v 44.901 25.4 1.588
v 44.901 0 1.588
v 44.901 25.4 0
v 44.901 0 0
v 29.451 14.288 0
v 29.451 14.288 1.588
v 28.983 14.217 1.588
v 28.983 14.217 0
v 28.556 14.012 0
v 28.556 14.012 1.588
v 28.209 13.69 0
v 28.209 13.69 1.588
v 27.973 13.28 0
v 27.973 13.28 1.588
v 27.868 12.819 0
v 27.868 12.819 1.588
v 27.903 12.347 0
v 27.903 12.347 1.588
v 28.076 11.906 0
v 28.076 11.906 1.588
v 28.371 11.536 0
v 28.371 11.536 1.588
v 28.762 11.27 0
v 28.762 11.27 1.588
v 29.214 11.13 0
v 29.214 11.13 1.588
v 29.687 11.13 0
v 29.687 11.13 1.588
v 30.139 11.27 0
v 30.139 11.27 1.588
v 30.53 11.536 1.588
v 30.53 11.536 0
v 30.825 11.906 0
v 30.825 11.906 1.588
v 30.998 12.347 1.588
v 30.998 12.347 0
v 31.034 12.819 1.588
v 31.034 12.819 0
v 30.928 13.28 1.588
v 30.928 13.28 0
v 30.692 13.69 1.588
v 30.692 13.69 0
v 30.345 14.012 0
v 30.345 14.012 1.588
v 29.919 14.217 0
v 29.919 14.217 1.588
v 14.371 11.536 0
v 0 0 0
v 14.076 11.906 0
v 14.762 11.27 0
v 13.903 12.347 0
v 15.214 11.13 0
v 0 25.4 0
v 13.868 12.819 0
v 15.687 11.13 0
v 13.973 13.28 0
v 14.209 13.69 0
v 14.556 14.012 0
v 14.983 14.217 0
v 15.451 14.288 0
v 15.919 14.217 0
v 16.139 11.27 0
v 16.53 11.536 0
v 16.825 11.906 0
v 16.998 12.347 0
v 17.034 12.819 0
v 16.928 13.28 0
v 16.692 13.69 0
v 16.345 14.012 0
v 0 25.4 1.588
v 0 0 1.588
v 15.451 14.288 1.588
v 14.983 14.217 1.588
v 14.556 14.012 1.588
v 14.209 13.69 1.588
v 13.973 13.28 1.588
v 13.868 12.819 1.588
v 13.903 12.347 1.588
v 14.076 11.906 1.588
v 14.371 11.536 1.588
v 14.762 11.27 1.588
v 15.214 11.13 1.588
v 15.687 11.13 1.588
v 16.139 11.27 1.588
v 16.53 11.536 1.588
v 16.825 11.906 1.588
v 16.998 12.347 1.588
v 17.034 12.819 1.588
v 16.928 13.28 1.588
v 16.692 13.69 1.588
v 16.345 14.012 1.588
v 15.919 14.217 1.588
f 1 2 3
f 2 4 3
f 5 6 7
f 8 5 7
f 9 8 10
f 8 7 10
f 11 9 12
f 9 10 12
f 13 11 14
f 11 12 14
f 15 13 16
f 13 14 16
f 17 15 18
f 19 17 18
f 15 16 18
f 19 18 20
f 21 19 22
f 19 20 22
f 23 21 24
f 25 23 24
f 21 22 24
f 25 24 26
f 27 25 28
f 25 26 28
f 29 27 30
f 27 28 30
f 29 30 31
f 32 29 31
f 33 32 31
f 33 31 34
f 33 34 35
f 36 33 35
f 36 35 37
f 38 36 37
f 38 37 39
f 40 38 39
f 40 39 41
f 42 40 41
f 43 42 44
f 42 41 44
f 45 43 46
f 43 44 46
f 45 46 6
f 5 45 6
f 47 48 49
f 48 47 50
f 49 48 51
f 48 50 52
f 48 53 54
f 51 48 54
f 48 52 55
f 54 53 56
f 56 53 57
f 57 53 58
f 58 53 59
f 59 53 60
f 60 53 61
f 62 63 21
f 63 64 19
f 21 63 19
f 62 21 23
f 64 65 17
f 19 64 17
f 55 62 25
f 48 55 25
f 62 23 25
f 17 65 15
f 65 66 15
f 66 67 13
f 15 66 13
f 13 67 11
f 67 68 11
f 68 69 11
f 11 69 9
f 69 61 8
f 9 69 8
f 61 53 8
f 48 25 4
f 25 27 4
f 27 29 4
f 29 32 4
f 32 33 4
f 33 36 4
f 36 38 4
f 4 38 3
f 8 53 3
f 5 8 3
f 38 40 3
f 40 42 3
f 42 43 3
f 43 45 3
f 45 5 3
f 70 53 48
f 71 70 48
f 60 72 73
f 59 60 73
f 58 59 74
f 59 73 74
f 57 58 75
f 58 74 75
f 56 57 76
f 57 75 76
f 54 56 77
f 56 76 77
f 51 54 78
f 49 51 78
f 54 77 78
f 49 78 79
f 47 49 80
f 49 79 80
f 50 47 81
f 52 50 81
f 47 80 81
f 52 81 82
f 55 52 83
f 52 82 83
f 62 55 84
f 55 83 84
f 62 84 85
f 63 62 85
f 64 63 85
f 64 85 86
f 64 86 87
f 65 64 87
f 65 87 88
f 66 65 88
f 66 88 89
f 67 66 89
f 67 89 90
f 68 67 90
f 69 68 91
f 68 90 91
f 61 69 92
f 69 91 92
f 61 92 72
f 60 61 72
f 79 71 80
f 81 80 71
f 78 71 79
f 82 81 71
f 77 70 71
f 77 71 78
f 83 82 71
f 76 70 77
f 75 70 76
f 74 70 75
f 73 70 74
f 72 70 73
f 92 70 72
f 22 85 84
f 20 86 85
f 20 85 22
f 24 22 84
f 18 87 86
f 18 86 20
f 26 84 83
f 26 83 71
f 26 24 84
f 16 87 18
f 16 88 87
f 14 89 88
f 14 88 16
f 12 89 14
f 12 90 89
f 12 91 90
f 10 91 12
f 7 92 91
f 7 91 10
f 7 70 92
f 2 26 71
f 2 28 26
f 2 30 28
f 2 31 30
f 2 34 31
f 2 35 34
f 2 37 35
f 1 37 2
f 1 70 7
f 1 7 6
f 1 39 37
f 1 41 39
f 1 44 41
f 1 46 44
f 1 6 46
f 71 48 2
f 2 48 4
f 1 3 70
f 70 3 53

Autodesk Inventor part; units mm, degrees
ref_plane "YZ Plane" through (0, 0, 0) normal (1, 0, 0) x (0, 1, 0)
ref_plane "XZ Plane" through (0, 0, 0) normal (0, 1, 0) x (-1, 0, 0)
ref_plane "XY Plane" through (0, 0, 0) normal (0, 0, 1) x (1, 0, 0)
sketch "Sketch1" plane through (0, 0, 0) normal (0, 0, 1) x (1, 0, 0)
  line L0 (0, 0) -> (44.9013, 0)
  line L1 (44.9013, 0) -> (44.9013, 25.4)
  line L2 (44.9013, 25.4) -> (0, 25.4)
  line L3 (0, 25.4) -> (0, 0)
  line L4 (0, 12.7) -> (44.9013, 12.7) construction
  point P0 (15.4506, 12.7)
  point P1 (29.4506, 12.7)
  dimension "d0" = 44.9013
  dimension "d1" = 25.4
  dimension "d3" = 14
  dimension "d4" = 15.4506
  dimension "d5" = 15.4506
extrude "Plate1" add sketch "Sketch1" along normal blind 1.5875
hole "Hole1" at (15.4506, 12.7, 0) at (29.4506, 12.7, 0) direction (0, 0, 1) diameter 3.175 end through all
equation "\"d4\" = d5"
equation "\"d11\" = Thickness"
equation "\"BendRadius\" = Thickness"
equation "\"BendReliefWidth\" = Thickness"
equation "\"BendReliefDepth\" = 0.5 * Thickness"
equation "\"CornerReliefSize\" = 4 * Thickness"
equation "\"MinimumRemnant\" = 2 * Thickness"
equation "\"TransitionRadius\" = BendRadius"
equation "\"JacobiRadiusSize\" = BendRadius"
equation "\"GapSize\" = Thickness"
equation "\"d2\" = BendRadius"
equation "\"Thickness\" = 1.5875"
properties part number "Bumper Rail Stand Top Cap"
